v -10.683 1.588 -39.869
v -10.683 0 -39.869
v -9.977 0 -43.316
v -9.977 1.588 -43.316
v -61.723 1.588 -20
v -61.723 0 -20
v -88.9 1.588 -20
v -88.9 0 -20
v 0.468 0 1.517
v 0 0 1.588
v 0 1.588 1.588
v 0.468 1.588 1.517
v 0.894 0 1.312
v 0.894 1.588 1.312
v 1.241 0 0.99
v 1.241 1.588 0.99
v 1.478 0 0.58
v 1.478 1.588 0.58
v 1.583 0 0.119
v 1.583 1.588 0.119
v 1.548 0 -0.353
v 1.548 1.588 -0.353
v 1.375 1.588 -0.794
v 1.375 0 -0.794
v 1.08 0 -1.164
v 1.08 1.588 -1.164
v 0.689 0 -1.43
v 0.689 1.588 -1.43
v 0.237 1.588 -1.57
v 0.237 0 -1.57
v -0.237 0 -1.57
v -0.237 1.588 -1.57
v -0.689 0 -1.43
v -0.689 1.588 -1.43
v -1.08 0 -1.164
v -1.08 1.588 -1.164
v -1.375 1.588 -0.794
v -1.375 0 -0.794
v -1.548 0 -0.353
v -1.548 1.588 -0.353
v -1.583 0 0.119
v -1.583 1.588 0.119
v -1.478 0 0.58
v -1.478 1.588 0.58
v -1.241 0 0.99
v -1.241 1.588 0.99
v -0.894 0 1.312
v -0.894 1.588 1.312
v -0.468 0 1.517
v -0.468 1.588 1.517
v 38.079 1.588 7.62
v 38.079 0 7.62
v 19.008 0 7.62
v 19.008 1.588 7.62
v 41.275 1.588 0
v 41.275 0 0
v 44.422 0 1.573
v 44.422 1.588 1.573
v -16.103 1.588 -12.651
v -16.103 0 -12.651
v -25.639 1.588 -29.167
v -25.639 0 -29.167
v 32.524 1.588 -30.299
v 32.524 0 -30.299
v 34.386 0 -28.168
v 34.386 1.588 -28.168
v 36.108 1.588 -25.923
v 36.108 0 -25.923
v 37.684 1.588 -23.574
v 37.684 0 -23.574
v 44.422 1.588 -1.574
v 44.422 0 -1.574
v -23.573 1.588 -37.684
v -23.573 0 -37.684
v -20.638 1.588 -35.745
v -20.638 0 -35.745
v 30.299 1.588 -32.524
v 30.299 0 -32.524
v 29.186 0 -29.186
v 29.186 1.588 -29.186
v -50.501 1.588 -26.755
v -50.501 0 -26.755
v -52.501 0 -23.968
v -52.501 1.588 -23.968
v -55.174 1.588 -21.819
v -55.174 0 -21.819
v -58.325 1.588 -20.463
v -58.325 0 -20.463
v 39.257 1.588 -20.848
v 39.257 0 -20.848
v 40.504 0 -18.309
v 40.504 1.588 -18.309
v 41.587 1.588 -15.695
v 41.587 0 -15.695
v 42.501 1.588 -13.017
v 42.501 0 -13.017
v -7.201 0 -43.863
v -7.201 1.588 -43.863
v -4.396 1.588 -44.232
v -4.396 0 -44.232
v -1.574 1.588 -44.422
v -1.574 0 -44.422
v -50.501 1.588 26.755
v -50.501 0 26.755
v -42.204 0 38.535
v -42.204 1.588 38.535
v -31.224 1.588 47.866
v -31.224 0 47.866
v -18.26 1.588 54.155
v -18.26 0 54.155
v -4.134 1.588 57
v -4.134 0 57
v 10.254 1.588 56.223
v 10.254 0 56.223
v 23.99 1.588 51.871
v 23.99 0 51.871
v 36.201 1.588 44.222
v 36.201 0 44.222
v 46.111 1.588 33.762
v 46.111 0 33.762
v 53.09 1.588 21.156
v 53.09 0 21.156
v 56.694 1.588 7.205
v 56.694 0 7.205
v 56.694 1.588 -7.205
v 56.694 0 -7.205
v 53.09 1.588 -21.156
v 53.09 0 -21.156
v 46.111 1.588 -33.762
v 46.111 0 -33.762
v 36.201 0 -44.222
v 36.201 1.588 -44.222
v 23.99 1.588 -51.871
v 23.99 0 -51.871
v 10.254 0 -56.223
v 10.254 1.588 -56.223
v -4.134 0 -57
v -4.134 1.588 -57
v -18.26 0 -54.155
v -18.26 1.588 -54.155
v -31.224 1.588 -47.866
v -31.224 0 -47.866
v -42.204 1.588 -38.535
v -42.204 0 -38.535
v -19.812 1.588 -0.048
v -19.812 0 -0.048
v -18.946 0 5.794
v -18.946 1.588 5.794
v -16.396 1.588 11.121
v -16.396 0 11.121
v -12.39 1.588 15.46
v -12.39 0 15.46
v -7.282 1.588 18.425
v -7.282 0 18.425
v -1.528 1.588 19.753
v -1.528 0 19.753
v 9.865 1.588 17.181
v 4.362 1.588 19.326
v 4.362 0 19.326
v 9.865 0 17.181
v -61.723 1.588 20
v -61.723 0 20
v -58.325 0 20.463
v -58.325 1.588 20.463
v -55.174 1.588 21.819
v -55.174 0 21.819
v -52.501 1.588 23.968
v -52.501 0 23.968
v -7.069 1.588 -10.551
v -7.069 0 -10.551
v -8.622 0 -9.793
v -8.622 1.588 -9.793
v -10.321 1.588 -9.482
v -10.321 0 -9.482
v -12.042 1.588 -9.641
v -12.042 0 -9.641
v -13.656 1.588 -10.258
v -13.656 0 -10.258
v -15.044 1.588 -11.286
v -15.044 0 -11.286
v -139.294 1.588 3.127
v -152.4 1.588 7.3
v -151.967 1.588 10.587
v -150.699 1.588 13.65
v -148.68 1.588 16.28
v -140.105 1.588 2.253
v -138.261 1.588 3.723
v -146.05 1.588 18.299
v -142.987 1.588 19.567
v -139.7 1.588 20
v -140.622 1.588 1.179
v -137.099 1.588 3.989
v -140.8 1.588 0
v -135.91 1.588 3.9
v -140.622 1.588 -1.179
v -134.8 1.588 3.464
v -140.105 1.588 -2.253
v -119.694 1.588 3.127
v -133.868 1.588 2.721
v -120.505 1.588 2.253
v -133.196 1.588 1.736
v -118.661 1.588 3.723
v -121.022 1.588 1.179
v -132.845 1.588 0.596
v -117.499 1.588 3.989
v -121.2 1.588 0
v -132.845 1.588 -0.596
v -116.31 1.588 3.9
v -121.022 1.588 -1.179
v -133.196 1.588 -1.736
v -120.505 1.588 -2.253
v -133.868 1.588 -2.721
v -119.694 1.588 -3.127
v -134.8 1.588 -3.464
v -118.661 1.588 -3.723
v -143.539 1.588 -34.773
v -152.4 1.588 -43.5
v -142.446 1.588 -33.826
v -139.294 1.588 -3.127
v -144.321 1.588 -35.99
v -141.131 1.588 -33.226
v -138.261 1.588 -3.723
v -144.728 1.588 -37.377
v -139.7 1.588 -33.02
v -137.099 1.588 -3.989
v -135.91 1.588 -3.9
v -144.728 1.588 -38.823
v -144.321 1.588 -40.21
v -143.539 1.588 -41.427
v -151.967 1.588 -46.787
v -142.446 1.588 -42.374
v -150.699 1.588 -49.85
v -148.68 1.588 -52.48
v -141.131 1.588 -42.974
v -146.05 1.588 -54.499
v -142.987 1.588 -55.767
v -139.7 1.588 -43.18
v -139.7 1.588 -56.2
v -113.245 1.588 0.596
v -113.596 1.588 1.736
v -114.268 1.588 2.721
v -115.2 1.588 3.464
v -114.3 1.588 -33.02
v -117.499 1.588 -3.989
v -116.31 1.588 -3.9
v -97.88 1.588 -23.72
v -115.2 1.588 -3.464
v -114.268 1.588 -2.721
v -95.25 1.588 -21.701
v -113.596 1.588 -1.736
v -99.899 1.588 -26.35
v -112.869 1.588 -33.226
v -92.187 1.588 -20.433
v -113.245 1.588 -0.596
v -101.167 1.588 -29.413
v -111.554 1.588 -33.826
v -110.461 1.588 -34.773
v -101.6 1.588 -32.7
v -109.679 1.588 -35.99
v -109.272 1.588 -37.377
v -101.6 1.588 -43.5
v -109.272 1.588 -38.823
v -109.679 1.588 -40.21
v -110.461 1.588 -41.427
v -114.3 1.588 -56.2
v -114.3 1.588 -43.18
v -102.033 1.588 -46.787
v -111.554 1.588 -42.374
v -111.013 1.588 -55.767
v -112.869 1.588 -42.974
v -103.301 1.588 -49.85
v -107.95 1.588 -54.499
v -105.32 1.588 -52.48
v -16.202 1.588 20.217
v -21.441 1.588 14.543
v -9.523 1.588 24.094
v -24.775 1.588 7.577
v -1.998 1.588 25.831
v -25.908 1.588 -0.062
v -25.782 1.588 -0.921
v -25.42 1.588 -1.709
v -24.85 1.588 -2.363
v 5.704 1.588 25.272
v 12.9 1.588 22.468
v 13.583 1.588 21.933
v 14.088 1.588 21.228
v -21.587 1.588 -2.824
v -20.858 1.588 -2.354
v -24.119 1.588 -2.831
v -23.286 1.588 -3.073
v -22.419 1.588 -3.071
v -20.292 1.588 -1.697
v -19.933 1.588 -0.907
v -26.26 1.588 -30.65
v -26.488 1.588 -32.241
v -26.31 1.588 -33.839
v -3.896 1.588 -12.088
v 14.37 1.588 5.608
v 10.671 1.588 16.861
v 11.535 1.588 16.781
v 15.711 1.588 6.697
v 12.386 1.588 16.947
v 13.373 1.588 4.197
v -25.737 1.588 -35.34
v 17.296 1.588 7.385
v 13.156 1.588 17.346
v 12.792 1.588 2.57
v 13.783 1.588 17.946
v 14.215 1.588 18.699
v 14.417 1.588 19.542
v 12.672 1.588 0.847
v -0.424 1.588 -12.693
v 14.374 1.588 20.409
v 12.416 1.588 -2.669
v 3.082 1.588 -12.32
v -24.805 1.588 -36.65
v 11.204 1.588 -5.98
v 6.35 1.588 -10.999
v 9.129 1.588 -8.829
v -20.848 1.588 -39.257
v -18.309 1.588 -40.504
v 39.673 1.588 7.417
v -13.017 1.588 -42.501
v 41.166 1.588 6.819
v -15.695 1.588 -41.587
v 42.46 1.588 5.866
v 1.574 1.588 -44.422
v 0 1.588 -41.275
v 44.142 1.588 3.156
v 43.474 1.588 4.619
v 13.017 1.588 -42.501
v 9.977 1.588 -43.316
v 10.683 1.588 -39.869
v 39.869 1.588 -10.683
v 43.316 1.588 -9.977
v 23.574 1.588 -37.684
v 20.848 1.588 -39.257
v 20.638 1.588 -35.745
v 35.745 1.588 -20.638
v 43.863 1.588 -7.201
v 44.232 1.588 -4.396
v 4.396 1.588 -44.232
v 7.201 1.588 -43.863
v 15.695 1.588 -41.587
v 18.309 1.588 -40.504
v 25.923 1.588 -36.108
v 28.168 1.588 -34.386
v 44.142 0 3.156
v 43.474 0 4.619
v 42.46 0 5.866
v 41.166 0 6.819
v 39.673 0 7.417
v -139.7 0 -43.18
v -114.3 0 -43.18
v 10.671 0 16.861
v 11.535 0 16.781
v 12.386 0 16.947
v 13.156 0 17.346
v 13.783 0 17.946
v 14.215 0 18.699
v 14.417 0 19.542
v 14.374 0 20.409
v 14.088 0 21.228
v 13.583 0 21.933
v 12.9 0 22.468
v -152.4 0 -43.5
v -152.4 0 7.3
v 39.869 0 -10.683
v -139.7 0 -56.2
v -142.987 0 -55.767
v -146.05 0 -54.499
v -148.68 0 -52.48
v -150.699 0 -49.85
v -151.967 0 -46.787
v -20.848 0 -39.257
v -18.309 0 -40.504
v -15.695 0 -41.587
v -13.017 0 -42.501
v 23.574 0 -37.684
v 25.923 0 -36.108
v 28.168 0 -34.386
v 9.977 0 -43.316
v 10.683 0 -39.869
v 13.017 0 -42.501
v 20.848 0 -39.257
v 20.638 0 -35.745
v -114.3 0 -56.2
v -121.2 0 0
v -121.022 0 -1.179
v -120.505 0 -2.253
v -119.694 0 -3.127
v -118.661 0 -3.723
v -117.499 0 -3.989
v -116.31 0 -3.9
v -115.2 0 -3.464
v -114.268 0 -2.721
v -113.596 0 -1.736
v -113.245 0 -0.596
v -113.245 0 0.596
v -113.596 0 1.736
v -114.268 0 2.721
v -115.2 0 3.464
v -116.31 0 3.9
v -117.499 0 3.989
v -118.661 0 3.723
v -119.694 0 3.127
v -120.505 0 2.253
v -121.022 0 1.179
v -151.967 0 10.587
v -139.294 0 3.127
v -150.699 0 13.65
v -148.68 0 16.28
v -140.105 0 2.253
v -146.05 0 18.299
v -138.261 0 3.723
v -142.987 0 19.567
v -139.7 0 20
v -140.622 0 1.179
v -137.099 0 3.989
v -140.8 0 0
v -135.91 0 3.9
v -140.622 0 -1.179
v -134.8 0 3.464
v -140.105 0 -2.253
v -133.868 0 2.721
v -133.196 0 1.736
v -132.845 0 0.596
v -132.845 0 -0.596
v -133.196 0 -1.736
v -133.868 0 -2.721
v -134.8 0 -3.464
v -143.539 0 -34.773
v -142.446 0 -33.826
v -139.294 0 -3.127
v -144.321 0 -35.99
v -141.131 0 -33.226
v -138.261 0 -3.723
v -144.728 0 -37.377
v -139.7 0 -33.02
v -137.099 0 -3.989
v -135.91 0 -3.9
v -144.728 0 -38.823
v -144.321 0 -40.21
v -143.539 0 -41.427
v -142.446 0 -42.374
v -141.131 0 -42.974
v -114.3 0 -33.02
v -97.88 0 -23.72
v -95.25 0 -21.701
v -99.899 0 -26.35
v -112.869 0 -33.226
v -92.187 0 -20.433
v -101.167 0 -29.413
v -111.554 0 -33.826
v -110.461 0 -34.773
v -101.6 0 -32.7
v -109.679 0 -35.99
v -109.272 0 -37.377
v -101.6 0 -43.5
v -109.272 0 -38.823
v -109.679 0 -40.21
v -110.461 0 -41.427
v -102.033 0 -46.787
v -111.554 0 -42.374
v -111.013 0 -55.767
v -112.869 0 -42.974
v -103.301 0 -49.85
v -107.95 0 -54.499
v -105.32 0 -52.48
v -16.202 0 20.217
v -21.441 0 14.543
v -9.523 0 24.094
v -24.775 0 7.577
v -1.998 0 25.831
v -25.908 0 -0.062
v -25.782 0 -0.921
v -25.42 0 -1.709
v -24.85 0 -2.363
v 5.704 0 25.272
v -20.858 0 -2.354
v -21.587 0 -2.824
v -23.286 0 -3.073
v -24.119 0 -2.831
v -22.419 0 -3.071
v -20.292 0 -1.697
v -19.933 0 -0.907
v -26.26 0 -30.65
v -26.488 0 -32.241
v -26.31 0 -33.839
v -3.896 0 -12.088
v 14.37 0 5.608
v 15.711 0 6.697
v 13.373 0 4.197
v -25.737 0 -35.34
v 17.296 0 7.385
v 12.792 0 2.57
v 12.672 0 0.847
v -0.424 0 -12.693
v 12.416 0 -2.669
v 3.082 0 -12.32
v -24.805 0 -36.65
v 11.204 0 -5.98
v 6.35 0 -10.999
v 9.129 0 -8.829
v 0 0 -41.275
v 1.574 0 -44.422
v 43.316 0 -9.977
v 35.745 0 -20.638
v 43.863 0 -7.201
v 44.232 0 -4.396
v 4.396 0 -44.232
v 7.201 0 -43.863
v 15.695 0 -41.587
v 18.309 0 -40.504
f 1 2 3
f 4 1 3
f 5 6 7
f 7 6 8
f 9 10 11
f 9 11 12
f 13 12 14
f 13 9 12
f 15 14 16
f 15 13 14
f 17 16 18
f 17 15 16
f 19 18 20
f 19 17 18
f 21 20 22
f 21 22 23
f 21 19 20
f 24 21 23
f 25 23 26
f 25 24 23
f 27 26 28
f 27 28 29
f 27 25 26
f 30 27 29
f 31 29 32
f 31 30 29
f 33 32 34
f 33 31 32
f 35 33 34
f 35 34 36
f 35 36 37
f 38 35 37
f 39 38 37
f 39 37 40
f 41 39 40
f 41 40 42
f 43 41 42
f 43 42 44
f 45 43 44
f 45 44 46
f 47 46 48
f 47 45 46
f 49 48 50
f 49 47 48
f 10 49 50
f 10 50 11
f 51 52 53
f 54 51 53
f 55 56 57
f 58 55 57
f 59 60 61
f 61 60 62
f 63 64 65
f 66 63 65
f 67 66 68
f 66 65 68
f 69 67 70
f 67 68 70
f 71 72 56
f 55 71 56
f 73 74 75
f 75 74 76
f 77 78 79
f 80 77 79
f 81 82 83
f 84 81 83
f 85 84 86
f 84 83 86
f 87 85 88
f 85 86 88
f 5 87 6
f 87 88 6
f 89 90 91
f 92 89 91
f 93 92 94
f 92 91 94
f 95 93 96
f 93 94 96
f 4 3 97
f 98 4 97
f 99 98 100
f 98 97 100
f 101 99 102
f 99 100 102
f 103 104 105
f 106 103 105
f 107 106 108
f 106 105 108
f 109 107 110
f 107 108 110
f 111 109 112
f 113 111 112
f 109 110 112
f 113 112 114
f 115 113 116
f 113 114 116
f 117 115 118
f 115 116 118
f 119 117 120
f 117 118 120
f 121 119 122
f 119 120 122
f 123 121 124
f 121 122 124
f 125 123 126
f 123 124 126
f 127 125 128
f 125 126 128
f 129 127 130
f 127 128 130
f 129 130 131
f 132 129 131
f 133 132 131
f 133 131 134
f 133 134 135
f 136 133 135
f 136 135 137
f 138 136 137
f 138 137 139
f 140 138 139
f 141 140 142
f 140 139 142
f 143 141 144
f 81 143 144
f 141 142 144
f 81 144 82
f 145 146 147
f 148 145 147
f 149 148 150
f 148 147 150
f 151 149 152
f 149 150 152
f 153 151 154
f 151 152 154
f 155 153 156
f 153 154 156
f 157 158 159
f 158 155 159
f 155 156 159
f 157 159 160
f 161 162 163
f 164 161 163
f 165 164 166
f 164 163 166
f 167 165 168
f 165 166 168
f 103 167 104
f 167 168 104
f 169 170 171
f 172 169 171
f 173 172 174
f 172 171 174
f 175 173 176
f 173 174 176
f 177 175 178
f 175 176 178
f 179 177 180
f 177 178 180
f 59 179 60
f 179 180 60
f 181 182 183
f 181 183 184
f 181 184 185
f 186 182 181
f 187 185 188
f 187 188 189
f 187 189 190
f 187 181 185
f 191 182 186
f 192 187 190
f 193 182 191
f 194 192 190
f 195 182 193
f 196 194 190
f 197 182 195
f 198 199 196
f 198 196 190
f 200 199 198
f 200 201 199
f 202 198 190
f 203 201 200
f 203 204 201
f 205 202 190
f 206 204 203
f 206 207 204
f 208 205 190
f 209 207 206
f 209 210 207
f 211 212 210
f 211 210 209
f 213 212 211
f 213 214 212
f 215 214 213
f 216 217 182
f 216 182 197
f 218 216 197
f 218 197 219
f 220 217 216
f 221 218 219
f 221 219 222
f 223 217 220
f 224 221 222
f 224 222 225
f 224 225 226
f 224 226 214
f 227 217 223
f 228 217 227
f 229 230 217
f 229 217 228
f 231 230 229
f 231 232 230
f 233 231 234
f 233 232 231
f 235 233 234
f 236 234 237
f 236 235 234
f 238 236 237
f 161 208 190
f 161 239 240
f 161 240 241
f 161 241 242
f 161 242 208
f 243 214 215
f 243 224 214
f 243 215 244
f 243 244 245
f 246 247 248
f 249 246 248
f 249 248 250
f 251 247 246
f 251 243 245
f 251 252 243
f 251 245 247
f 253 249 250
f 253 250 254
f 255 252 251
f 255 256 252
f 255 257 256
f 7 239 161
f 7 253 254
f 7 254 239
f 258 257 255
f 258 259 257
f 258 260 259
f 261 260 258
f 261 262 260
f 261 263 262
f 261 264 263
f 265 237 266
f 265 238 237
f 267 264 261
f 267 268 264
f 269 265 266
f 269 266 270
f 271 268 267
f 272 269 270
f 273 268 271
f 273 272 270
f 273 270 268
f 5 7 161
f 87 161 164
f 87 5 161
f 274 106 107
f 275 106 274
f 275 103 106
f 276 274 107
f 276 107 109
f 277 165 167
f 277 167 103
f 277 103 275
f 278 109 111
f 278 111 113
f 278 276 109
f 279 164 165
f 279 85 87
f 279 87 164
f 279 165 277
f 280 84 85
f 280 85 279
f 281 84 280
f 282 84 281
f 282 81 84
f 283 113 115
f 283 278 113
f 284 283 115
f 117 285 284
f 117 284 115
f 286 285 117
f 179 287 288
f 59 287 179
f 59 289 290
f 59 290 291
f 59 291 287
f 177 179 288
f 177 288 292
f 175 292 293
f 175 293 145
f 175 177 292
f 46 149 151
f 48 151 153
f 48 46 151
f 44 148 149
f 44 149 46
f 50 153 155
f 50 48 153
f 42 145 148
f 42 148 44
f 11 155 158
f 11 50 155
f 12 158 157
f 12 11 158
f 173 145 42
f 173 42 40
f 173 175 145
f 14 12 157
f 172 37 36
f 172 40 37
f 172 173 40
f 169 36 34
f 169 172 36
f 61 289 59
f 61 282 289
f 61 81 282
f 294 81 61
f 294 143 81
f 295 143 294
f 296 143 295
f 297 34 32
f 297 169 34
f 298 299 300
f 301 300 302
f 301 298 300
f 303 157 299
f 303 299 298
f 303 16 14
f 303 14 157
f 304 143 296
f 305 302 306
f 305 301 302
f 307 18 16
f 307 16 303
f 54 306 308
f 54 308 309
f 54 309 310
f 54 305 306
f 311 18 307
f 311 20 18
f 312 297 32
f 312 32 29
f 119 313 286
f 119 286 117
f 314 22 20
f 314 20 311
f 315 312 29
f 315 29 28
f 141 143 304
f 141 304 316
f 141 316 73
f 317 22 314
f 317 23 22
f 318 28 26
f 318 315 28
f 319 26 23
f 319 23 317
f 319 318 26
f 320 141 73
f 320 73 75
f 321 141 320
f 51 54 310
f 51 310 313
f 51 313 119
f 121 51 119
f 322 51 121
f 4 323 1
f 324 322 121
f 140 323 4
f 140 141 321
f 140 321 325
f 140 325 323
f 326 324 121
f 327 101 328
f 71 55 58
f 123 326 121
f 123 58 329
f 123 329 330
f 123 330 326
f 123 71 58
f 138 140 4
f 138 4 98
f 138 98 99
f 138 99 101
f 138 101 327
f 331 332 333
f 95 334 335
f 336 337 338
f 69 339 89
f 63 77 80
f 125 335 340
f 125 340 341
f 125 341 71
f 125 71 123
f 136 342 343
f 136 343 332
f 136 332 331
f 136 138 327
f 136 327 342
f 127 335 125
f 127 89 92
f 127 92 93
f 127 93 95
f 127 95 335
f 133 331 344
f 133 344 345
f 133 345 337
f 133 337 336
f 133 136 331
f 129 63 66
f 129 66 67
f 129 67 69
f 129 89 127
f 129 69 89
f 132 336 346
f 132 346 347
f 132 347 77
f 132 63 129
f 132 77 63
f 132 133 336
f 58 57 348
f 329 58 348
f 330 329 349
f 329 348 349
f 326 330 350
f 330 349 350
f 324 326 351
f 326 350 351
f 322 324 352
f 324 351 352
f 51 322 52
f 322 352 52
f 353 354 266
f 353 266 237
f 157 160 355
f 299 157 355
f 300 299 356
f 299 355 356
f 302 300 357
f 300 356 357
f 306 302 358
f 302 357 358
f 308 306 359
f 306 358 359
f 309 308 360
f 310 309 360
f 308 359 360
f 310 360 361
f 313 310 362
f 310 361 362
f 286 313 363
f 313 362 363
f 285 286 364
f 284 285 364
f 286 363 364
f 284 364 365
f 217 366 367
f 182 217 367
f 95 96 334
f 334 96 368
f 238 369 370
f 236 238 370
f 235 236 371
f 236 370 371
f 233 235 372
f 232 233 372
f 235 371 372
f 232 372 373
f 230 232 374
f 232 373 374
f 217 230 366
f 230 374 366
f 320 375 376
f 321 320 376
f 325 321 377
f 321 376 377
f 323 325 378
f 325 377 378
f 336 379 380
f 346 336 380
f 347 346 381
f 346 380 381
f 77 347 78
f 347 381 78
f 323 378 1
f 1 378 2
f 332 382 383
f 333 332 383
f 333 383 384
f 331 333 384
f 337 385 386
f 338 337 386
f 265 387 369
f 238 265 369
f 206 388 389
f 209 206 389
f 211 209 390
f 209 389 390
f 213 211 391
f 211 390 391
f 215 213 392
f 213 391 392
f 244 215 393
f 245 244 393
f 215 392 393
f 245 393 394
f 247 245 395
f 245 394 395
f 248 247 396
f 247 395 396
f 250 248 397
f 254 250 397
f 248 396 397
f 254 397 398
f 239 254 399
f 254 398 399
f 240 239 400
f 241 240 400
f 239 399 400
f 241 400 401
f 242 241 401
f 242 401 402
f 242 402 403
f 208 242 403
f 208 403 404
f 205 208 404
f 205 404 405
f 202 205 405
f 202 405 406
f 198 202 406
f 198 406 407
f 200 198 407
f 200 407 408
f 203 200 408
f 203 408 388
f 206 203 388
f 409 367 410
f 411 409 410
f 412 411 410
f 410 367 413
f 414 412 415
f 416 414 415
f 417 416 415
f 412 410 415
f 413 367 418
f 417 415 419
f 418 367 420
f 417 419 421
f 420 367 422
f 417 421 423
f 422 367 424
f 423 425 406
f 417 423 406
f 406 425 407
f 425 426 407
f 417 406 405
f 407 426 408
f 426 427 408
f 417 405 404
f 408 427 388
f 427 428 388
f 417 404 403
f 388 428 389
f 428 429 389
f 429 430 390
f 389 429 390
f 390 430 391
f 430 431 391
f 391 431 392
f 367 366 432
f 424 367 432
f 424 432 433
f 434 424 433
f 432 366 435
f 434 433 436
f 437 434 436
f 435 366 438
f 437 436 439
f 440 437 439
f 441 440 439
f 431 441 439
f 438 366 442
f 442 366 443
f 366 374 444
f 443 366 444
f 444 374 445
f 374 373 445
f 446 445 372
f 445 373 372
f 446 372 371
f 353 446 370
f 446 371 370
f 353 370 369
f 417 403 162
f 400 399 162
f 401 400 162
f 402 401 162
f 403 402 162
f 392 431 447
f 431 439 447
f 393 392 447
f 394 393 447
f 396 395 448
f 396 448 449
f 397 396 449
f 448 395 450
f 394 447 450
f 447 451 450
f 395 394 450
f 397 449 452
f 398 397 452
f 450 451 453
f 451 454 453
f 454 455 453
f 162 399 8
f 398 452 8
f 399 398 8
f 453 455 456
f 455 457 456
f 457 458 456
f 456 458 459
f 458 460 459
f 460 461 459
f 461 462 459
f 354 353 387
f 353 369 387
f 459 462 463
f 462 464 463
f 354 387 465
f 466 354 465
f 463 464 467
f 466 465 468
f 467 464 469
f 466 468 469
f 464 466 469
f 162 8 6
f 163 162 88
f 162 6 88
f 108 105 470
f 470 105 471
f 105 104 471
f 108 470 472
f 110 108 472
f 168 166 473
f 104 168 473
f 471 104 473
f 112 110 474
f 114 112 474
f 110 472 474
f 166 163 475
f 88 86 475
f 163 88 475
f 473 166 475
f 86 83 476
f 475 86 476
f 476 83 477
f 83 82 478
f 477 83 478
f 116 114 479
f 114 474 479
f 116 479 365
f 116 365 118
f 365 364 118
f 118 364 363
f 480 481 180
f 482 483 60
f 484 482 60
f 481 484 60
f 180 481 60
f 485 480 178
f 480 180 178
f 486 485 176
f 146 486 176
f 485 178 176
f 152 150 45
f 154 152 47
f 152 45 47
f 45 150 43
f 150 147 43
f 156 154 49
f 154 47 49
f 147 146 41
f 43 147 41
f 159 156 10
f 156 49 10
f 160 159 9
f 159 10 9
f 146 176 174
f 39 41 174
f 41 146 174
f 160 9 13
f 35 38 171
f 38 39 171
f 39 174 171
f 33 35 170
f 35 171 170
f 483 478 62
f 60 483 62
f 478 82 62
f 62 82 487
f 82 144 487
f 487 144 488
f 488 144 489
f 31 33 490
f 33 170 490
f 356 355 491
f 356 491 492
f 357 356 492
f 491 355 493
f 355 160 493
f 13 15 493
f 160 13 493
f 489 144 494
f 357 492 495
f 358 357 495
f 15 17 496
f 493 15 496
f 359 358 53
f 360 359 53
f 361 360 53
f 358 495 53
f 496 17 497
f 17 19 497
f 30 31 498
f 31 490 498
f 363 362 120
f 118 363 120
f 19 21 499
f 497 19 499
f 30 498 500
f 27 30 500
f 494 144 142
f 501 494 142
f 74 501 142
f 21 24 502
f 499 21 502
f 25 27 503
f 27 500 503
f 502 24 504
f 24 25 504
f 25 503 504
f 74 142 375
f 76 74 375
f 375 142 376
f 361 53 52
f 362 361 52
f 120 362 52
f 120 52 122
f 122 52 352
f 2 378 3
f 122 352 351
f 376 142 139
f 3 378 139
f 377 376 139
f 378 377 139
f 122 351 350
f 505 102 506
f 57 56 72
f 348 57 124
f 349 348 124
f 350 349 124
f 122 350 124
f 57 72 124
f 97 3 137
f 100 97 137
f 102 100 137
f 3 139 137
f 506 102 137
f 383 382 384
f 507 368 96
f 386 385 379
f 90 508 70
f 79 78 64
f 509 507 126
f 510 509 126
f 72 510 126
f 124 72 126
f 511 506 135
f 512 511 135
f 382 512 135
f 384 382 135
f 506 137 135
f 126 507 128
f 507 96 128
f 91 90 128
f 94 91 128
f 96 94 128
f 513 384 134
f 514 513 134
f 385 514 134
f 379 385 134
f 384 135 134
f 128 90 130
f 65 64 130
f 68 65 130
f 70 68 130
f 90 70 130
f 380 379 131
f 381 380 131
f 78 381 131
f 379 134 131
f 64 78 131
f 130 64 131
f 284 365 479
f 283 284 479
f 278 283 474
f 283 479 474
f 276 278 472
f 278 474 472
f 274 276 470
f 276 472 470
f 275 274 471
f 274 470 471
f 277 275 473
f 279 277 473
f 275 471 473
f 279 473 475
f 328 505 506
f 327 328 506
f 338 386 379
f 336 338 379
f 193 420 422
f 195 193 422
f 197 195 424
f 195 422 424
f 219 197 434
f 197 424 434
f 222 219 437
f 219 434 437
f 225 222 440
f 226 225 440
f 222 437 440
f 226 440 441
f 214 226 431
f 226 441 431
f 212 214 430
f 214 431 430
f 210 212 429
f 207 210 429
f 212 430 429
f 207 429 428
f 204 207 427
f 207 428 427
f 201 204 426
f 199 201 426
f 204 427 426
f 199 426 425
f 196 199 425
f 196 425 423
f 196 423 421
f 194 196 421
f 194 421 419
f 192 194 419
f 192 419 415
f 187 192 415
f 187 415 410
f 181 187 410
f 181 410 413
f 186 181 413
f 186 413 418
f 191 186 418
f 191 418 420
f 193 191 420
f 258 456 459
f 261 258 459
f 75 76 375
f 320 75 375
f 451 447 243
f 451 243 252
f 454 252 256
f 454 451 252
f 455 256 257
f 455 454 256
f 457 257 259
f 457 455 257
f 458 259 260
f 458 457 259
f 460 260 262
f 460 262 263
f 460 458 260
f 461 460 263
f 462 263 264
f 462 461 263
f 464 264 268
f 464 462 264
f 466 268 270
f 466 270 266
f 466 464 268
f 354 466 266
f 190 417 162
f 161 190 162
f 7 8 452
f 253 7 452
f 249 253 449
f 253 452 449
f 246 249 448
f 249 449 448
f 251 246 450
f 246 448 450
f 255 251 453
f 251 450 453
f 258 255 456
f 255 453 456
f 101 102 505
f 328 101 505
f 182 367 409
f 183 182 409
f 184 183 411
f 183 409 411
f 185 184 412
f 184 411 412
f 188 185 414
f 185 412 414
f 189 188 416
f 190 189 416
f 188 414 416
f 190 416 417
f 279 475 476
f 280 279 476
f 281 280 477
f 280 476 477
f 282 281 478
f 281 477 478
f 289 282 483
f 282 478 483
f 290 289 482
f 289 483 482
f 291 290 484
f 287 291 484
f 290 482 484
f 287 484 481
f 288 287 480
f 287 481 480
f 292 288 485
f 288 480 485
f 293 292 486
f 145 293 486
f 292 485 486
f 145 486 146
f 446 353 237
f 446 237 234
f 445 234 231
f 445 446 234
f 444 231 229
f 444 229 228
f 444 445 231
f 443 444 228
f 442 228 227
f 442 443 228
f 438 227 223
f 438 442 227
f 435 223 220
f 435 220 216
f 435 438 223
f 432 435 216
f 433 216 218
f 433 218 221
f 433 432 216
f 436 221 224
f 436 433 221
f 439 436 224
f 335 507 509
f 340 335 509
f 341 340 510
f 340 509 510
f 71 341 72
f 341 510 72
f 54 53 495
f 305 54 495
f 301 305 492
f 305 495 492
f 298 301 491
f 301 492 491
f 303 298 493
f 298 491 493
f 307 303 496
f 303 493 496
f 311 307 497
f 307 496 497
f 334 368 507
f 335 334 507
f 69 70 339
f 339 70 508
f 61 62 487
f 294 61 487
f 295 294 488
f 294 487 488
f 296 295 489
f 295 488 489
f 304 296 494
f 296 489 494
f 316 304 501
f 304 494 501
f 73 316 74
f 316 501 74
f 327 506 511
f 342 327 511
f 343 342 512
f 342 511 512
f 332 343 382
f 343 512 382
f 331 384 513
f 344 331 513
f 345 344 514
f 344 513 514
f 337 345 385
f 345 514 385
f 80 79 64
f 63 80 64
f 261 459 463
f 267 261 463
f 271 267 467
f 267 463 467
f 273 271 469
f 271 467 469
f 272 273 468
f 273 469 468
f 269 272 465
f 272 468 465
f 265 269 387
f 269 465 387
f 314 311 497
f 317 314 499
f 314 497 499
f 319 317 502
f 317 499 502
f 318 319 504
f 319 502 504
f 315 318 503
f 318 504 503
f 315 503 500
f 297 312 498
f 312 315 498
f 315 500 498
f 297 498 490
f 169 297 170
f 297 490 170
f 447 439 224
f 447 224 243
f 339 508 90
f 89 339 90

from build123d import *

# Parameters (mm, degrees)
SKETCH1_R                 = 1.27
SKETCH1_R_2               = 1.5875
BOSS_EXTRUDE1_DEPTH       = 1.5875
CUT_EXTRUDE3_DEPTH        = 163.771012948
CUT_EXTRUDE4_DEPTH        = 163.771012948
F_8_0MM_DOWEL_HOLE1_D     = 8
F_8_0MM_DOWEL_HOLE1_DEPTH = 5.08
F_8_0MM_DOWEL_HOLE1_TIP   = 2.403442476


with BuildPart() as part:
    # Sketch1 → Boss-Extrude1 (new body)
    with BuildSketch(Plane(origin=(0, 0, 0), x_dir=(1, 0, 0), z_dir=(0, 1, 0))):
        with BuildLine():
            Line((-152.4, 43.5), (-152.4, -7.3))
            ThreePointArc((-152.4, -7.3), (-148.680256121, -16.280256121), (-139.7, -20))
            Line((-139.7, -20), (-61.723030548, -20))
            ThreePointArc((-61.723030548, -20), (-55.173880707, -21.818886254), (-50.500661357, -26.754545455))
            ThreePointArc((-50.500661357, -26.754545455), (57.15, 0), (-50.500661357, 26.754545455))
            ThreePointArc((-50.500661357, 26.754545455), (-55.173880707, 21.818886254), (-61.723030548, 20))
            Line((-61.723030548, 20), (-88.9, 20))
            ThreePointArc((-88.9, 20), (-97.880256121, 23.719743879), (-101.6, 32.7))
            Line((-101.6, 32.7), (-101.6, 43.5))
            ThreePointArc((-101.6, 43.5), (-105.319743879, 52.480256121), (-114.3, 56.2))
            Line((-114.3, 56.2), (-139.7, 56.2))
            ThreePointArc((-139.7, 56.2), (-148.680256121, 52.480256121), (-152.4, 43.5))
        make_face()
        with Locations(Location((-136.8, 0, 0), (0, 0, 270))):
            Circle(SKETCH1_R, mode=Mode.SUBTRACT)
        with Locations(Location((-117.2, 0, 0), (0, 0, 270))):
            Circle(SKETCH1_R, mode=Mode.SUBTRACT)
        with Locations(Location((0, 0, 0), (0, 0, 270))):
            Circle(SKETCH1_R_2, mode=Mode.SUBTRACT)
        with BuildLine():
            Line((-139.7, 33.02), (-114.3, 33.02))
            ThreePointArc((-114.3, 33.02), (-109.22, 38.1), (-114.3, 43.18))
            Line((-114.3, 43.18), (-139.7, 43.18))
            ThreePointArc((-139.7, 43.18), (-144.78, 38.1), (-139.7, 33.02))
        make_face(mode=Mode.SUBTRACT)
    extrude(amount=BOSS_EXTRUDE1_DEPTH)

    # Sketch5 → Cut-Extrude3 (cut, through all)
    with BuildSketch(Plane.XZ):
        with BuildLine():
            ThreePointArc((-19.811942673, -0.047660352), (-9.947246413, 17.133815477), (9.864696261, 17.18147583))
            ThreePointArc((9.864696261, 17.18147583), (14.025645813, 18.307134225), (12.899987418, 22.468083777))
            ThreePointArc((12.899987418, 22.468083777), (-13.007937617, 22.405758701), (-25.907925034, -0.062325076))
            ThreePointArc((-25.907925034, -0.062325076), (-22.852601492, -3.102983895), (-19.811942673, -0.047660352))
        make_face()
    extrude(amount=-CUT_EXTRUDE3_DEPTH, mode=Mode.SUBTRACT)

    # Sketch6 → Cut-Extrude4 (cut, through all)
    with BuildSketch(Plane.XZ):
        with BuildLine():
            Line((-16.102923339, -12.651081374), (-25.638527302, -29.167231918))
            ThreePointArc((-25.638527302, -29.167231918), (-26.310404552, -33.838744139), (-23.573299486, -37.683572006))
            Line((-23.573299486, -37.683572006), (-20.6375, -35.745198541))
            Line((-20.6375, -35.745198541), (-20.848318298, -39.257484944))
            ThreePointArc((-20.848318298, -39.257484944), (-17.010278569, -41.06644522), (-13.017246571, -42.501221061))
            Line((-13.017246571, -42.501221061), (-10.682756087, -39.86858848))
            Line((-10.682756087, -39.86858848), (-9.977344313, -43.315760417))
            ThreePointArc((-9.977344313, -43.315760417), (-5.801889244, -44.069724088), (-1.5735692, -44.422138399))
            Line((-1.5735692, -44.422138399), (0, -41.275))
            Line((0, -41.275), (1.5735692, -44.422138399))
            ThreePointArc((1.5735692, -44.422138399), (5.801889244, -44.069724088), (9.977344313, -43.315760417))
            Line((9.977344313, -43.315760417), (10.682756087, -39.86858848))
            Line((10.682756087, -39.86858848), (13.017246571, -42.501221061))
            ThreePointArc((13.017246571, -42.501221061), (17.010278569, -41.06644522), (20.848318298, -39.257484944))
            Line((20.848318298, -39.257484944), (20.6375, -35.745198541))
            Line((20.6375, -35.745198541), (23.573820101, -37.683915744))
            ThreePointArc((23.573820101, -37.683915744), (27.059445519, -35.264555976), (30.298513845, -32.523876749))
            Line((30.298513845, -32.523876749), (29.185832393, -29.185832393))
            Line((29.185832393, -29.185832393), (32.523876749, -30.298513845))
            ThreePointArc((32.523876749, -30.298513845), (35.264555976, -27.059445519), (37.683915744, -23.573820101))
            Line((37.683915744, -23.573820101), (35.745198541, -20.6375))
            Line((35.745198541, -20.6375), (39.257484944, -20.848318298))
            ThreePointArc((39.257484944, -20.848318298), (41.06644522, -17.010278569), (42.501221061, -13.017246571))
            Line((42.501221061, -13.017246571), (39.86858848, -10.682756087))
            Line((39.86858848, -10.682756087), (43.315760417, -9.977344313))
            ThreePointArc((43.315760417, -9.977344313), (44.069724088, -5.801889244), (44.422138399, -1.5735692))
            Line((44.422138399, -1.5735692), (41.275, 0))
            Line((41.275, 0), (44.421580406, 1.573290203))
            ThreePointArc((44.421580406, 1.573290203), (42.460414333, 5.866106656), (38.07882745, 7.62))
            Line((38.07882745, 7.62), (19.007619525, 7.62))
            ThreePointArc((19.007619525, 7.62), (14.370235205, 5.607875824), (12.67174635, 0.846666667))
            ThreePointArc((12.67174635, 0.846666667), (6.35, -10.998522628), (-7.069108017, -10.550720916))
            ThreePointArc((-7.069108017, -10.550720916), (-12.041680527, -9.641050833), (-16.102923339, -12.651081374))
        make_face()
    extrude(amount=-CUT_EXTRUDE4_DEPTH, mode=Mode.SUBTRACT)

    # Ø8.0mm Dowel Hole1
    with Locations(Plane(origin=(0, 1.5875, 0), x_dir=(1, 0, 0), z_dir=(0, 1, 0))):
        with Locations((-136.8, 0), (-117.2, 0)):
            Hole(F_8_0MM_DOWEL_HOLE1_D / 2, depth=F_8_0MM_DOWEL_HOLE1_DEPTH)
            with Locations((0, 0, -(F_8_0MM_DOWEL_HOLE1_DEPTH + F_8_0MM_DOWEL_HOLE1_TIP / 2))):  # 118° drill point
                Cone(0, F_8_0MM_DOWEL_HOLE1_D / 2, F_8_0MM_DOWEL_HOLE1_TIP, mode=Mode.SUBTRACT)


solid = part.part
